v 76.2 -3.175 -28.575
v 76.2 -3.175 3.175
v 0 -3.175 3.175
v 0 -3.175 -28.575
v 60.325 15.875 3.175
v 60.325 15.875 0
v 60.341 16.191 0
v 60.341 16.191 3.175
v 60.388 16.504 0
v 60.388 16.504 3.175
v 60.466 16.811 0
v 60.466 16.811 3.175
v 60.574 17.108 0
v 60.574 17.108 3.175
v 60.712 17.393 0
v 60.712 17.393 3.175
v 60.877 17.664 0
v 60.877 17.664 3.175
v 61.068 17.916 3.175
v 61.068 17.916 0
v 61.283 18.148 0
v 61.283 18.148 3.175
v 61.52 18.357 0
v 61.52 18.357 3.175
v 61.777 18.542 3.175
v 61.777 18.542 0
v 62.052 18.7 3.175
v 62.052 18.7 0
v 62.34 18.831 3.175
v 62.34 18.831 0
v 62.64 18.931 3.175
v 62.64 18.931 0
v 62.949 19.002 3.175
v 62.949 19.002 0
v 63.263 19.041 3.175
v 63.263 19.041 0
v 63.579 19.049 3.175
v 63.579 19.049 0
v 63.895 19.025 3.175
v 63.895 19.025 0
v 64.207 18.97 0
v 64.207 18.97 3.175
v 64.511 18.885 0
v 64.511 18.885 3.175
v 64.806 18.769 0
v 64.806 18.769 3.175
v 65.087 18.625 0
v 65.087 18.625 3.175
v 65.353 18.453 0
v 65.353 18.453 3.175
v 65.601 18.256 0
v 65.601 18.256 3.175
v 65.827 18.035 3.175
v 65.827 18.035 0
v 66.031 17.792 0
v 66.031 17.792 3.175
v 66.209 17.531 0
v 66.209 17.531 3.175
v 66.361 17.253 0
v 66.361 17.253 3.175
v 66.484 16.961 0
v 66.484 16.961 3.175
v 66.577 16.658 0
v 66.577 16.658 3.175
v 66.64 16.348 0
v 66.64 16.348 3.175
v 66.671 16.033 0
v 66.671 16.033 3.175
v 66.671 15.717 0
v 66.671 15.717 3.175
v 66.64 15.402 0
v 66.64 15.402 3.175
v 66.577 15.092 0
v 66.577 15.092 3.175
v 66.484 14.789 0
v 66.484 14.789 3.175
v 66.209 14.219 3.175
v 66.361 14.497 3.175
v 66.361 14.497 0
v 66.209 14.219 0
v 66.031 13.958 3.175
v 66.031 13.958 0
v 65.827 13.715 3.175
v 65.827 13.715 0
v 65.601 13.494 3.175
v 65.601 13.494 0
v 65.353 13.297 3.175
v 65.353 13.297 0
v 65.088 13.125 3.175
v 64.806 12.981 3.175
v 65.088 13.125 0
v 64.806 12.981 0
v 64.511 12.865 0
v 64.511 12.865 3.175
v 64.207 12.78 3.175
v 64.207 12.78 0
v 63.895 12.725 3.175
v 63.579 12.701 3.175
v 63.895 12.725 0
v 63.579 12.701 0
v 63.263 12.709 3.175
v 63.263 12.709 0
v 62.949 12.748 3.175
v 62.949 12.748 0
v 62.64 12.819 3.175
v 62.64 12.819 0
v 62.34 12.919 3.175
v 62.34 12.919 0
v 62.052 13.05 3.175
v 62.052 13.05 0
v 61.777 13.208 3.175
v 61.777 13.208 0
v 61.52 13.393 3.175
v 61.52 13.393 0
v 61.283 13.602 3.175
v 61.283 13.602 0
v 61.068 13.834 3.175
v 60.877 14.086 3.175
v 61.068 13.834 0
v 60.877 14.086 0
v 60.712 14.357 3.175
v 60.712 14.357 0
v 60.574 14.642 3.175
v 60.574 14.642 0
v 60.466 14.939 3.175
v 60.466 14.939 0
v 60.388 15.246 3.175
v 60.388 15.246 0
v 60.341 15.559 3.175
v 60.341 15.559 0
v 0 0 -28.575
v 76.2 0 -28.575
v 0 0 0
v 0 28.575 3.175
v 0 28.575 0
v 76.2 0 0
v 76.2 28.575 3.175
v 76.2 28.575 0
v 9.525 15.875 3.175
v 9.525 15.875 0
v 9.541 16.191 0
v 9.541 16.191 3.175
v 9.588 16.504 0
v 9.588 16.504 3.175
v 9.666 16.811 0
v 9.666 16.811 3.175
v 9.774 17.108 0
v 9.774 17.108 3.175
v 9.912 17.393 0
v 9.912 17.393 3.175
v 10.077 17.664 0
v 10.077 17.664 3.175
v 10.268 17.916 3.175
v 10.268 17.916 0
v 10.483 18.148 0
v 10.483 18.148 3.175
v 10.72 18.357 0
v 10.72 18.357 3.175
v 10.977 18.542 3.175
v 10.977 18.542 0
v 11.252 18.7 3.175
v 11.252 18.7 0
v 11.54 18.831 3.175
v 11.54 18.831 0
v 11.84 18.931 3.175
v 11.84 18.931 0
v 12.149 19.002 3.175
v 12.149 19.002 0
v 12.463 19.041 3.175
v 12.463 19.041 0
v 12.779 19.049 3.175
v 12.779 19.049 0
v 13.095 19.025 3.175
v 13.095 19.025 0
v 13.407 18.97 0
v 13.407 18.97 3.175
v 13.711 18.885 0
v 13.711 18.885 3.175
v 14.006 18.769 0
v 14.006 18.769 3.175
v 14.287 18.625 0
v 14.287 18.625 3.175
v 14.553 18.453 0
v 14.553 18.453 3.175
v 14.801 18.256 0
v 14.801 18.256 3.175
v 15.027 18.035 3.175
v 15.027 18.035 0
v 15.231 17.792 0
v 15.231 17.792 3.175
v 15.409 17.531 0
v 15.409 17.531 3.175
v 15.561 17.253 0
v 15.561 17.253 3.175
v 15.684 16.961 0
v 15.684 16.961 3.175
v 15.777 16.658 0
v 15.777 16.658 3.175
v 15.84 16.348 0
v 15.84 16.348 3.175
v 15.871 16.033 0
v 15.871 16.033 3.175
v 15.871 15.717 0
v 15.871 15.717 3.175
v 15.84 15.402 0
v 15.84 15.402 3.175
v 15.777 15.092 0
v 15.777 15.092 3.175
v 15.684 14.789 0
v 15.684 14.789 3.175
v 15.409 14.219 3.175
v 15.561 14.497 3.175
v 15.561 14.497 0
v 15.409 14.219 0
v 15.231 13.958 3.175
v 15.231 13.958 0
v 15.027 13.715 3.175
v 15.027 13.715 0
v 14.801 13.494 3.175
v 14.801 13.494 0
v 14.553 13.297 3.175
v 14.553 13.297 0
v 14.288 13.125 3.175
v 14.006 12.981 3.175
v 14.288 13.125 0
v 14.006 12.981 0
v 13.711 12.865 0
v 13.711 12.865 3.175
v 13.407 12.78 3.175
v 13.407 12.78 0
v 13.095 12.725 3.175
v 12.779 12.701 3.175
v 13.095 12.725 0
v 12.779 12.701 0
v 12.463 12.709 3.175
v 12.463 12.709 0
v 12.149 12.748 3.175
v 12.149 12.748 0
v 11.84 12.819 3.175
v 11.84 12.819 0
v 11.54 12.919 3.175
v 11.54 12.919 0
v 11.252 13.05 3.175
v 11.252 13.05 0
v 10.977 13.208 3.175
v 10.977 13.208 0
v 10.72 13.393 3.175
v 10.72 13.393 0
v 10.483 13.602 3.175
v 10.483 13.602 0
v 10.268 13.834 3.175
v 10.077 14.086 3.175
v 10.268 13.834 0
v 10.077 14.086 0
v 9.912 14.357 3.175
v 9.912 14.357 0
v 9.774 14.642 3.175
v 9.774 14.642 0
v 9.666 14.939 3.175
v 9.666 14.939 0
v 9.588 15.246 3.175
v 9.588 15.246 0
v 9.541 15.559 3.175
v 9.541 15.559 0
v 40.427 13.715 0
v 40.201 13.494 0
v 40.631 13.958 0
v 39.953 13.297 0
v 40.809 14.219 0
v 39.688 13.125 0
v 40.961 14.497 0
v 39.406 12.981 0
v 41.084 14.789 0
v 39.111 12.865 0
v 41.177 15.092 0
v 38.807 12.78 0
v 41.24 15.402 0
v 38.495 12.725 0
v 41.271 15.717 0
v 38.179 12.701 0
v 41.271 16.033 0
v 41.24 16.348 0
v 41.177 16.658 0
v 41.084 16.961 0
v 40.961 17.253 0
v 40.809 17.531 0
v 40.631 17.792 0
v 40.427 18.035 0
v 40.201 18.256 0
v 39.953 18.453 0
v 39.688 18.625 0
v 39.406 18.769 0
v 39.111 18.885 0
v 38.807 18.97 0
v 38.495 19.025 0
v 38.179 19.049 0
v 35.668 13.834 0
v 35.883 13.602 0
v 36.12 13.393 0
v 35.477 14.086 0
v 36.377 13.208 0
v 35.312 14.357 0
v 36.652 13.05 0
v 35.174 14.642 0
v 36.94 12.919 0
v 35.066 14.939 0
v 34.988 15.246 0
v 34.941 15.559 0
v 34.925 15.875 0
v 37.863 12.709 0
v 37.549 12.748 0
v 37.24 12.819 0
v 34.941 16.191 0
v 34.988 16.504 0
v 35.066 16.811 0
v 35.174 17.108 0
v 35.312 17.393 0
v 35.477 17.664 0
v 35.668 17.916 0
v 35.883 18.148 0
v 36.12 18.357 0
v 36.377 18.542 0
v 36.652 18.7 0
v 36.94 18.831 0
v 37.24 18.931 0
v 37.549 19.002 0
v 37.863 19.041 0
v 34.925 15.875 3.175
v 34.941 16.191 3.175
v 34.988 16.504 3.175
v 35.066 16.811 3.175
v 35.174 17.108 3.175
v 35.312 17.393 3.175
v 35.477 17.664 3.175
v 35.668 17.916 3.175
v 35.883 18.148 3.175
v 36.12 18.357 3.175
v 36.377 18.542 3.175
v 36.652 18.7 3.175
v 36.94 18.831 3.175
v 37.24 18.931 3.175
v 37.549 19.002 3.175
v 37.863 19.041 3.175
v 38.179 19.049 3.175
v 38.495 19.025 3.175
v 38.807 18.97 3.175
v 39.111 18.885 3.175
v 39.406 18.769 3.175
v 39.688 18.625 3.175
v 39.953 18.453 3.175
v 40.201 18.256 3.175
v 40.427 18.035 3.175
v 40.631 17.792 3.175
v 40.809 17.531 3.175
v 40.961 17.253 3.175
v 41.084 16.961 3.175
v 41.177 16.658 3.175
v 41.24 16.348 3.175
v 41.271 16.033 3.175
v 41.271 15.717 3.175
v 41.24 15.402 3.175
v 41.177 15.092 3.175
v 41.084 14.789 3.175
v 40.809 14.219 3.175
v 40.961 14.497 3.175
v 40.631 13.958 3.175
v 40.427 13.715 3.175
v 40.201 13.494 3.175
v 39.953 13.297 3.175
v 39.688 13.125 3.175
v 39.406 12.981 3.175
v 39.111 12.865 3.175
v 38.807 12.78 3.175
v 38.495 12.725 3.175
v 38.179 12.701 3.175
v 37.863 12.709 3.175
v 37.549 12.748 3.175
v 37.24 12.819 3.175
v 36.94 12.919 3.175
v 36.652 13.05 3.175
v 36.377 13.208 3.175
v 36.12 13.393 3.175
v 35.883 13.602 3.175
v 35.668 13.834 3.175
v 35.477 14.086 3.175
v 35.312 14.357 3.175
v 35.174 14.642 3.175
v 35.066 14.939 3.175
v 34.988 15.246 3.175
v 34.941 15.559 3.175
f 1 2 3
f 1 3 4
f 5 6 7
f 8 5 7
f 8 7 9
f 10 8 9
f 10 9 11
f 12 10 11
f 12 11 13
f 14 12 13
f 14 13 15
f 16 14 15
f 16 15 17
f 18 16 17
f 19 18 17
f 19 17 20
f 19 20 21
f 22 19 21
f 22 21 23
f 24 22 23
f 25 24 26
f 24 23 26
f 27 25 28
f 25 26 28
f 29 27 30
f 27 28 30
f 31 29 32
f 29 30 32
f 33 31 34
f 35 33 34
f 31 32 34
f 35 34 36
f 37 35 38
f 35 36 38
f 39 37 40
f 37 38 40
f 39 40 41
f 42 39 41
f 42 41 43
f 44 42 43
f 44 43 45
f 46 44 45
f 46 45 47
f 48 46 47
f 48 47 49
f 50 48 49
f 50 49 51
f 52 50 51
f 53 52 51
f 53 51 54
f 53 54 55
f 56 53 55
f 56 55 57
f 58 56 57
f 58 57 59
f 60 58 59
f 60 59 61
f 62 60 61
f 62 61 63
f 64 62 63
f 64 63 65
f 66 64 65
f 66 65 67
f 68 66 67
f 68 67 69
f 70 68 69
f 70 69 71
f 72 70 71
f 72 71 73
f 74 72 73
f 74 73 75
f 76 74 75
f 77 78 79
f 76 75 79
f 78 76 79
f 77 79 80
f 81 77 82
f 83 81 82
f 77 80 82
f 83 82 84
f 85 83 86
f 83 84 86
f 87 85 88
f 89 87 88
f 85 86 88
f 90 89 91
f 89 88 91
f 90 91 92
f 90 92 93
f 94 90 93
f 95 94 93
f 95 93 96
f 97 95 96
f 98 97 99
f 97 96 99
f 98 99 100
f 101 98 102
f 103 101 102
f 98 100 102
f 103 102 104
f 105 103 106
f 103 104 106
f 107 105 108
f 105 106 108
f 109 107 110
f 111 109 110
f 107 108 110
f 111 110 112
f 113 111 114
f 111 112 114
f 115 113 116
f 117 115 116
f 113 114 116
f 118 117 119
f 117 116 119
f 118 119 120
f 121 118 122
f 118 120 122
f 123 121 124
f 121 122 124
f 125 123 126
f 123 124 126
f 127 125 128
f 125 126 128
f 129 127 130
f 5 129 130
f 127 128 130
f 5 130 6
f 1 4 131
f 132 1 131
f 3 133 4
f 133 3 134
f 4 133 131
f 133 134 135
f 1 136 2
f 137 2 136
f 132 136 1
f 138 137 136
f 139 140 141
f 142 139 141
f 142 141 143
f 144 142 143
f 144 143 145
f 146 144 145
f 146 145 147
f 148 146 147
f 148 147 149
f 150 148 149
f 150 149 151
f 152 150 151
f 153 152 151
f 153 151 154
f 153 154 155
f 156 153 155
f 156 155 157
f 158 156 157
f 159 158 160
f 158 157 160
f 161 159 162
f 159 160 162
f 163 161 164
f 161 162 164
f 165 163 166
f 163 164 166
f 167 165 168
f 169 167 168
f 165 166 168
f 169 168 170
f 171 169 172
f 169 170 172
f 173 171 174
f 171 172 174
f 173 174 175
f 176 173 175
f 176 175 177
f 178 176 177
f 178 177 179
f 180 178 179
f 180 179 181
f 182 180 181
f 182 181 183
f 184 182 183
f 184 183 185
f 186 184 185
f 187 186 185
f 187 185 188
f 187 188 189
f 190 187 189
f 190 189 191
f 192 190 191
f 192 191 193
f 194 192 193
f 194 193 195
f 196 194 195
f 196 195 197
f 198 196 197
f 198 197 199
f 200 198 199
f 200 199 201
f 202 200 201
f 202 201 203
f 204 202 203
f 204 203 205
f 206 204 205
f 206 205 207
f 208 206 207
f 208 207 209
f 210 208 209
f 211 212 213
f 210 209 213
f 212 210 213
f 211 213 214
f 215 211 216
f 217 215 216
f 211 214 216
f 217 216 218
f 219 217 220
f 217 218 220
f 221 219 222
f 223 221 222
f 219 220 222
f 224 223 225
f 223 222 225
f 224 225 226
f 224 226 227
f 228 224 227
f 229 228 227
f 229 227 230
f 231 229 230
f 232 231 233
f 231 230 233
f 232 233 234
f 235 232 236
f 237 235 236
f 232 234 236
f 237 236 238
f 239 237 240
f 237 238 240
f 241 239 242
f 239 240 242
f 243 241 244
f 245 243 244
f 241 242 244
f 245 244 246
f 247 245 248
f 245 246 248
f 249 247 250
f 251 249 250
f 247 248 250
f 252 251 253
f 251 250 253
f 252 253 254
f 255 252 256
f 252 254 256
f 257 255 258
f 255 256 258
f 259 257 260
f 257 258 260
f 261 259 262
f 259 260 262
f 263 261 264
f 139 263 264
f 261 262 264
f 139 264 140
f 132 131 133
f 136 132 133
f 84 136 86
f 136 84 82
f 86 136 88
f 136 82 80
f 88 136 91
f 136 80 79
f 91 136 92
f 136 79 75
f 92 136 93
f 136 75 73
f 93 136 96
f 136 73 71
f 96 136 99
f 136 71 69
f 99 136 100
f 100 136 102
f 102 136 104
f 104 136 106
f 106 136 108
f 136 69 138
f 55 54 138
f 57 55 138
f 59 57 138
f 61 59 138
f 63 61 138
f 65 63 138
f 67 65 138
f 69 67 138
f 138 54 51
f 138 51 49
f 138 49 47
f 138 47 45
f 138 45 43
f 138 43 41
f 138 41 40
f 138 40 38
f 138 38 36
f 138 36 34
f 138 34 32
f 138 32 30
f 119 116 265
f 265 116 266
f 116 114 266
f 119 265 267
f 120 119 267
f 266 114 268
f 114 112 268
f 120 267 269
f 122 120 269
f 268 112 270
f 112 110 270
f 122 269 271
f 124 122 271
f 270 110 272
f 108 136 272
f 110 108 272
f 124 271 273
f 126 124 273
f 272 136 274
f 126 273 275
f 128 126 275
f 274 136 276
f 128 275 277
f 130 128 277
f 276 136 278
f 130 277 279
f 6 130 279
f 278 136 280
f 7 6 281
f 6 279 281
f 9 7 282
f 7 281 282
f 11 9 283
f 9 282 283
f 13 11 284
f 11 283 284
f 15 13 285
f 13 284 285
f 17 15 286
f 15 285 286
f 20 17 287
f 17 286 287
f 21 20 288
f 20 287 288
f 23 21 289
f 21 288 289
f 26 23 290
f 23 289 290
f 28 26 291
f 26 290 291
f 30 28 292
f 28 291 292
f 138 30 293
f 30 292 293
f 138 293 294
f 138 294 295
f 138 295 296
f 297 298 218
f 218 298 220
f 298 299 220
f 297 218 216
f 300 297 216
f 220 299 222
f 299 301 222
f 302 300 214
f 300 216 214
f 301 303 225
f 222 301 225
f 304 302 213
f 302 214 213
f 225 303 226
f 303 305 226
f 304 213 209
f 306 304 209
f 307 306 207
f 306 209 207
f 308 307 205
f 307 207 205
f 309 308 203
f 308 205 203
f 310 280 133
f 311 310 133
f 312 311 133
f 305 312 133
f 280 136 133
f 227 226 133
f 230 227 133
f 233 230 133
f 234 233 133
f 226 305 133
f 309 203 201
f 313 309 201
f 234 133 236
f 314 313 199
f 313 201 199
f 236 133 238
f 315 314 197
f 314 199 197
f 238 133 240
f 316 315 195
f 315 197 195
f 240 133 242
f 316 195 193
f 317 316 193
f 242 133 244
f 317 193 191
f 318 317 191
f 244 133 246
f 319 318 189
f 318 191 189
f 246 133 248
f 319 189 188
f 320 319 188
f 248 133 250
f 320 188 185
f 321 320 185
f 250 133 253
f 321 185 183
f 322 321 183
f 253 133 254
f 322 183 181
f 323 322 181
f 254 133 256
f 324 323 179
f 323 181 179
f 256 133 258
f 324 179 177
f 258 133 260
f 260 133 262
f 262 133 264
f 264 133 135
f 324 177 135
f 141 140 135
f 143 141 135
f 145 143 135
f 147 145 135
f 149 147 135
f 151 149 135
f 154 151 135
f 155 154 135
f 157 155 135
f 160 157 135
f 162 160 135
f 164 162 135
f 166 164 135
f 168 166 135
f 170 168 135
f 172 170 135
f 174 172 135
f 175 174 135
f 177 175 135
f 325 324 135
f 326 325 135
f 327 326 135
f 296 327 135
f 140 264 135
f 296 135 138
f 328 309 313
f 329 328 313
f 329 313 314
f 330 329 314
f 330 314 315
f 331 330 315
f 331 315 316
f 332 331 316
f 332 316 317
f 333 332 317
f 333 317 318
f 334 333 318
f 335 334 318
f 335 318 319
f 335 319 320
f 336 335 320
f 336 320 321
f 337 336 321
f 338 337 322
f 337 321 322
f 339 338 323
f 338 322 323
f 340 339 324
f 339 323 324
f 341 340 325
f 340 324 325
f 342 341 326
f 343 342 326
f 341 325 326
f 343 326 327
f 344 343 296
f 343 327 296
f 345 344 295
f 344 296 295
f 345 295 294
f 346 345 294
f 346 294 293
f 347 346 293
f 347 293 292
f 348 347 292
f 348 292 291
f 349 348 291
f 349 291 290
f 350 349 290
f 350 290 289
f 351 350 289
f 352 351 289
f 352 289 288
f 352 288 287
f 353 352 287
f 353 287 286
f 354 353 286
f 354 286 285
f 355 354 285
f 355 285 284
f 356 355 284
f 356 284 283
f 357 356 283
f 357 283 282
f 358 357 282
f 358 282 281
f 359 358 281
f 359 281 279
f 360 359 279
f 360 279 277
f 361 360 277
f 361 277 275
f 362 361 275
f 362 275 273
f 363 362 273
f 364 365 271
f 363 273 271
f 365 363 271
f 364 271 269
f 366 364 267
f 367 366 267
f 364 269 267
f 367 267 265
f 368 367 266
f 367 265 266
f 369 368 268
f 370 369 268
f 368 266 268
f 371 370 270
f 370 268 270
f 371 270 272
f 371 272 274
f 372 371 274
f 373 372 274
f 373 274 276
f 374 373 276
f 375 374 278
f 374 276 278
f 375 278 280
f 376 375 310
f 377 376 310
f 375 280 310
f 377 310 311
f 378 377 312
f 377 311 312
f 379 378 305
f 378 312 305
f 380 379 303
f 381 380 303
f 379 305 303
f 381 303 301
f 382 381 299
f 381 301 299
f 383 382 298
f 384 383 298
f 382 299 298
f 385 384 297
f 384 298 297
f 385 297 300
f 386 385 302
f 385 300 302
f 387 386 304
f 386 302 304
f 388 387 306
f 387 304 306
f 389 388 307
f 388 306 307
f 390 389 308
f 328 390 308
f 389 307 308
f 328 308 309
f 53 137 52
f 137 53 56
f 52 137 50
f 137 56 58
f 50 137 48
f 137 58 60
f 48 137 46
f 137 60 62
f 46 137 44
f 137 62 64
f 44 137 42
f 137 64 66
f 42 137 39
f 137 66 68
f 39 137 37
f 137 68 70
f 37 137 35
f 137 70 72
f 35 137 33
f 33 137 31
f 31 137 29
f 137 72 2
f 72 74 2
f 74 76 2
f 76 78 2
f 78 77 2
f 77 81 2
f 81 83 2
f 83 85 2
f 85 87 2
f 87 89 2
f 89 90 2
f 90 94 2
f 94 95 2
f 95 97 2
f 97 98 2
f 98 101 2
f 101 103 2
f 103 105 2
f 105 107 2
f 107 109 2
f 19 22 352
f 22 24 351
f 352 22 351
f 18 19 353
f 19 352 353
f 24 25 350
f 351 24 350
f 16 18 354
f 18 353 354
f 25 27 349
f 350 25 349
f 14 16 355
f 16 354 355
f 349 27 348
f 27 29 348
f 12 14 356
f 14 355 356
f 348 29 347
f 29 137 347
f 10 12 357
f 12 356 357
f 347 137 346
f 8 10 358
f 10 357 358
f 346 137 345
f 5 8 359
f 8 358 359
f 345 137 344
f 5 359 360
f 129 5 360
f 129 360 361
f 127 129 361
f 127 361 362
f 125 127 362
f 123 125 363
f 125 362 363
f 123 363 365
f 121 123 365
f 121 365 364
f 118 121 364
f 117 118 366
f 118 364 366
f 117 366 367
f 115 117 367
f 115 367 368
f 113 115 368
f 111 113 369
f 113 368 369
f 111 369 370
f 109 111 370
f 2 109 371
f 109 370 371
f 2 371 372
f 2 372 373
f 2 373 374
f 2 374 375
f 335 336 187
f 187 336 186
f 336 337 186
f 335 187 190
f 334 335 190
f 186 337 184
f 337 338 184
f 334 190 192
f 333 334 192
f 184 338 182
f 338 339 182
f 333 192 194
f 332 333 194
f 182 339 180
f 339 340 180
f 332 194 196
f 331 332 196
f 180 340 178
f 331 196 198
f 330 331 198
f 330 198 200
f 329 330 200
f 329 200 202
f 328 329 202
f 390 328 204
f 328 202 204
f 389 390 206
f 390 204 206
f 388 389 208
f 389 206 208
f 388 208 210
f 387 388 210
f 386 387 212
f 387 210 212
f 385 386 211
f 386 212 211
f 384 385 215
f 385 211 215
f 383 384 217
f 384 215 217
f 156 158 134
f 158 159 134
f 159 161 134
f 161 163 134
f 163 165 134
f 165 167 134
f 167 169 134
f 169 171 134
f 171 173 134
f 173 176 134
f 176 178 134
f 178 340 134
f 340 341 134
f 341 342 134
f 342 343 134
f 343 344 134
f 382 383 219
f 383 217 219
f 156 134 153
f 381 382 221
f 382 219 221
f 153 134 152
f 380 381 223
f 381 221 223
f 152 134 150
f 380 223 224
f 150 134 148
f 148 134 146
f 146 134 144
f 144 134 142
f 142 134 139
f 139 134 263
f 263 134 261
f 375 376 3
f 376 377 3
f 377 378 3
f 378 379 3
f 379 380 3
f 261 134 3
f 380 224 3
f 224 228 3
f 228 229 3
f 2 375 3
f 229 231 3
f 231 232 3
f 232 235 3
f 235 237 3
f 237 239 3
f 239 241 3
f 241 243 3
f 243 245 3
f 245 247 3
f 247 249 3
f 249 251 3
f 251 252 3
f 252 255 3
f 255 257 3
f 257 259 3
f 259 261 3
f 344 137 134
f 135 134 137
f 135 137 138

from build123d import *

# Parameters (mm, degrees)
SKETCH1_W           = 3.175
SKETCH1_H           = 28.575
BOSS_EXTRUDE1_DEPTH = 76.2
SKETCH2_R           = 3.175
CUT_EXTRUDE1_DEPTH  = 76.2


with BuildPart() as part:
    # Sketch1 → Boss-Extrude1 (new body)
    with BuildSketch(Plane(origin=(0, 0, 0), x_dir=(0, 0, -1), z_dir=(1, 0, 0))):
        with Locations((-1.5875, 14.2875)):
            Rectangle(SKETCH1_W, SKETCH1_H)
        Polygon((28.575, 0), (0, 0), (-3.175, 0), (-3.175, -3.175), (28.575, -3.175), align=None)
    extrude(amount=BOSS_EXTRUDE1_DEPTH)

    # Sketch2 → Cut-Extrude1 (cut)
    with BuildSketch(Plane(origin=(0, 0, 0), x_dir=(-1, 0, 0), z_dir=(0, 0, -1))):
        with Locations((-38.1, 15.875)):
            Circle(SKETCH2_R)
        with Locations((-63.5, 15.875)):
            Circle(SKETCH2_R)
        with Locations((-12.7, 15.875)):
            Circle(SKETCH2_R)
    extrude(amount=-CUT_EXTRUDE1_DEPTH, mode=Mode.SUBTRACT)


solid = part.part
